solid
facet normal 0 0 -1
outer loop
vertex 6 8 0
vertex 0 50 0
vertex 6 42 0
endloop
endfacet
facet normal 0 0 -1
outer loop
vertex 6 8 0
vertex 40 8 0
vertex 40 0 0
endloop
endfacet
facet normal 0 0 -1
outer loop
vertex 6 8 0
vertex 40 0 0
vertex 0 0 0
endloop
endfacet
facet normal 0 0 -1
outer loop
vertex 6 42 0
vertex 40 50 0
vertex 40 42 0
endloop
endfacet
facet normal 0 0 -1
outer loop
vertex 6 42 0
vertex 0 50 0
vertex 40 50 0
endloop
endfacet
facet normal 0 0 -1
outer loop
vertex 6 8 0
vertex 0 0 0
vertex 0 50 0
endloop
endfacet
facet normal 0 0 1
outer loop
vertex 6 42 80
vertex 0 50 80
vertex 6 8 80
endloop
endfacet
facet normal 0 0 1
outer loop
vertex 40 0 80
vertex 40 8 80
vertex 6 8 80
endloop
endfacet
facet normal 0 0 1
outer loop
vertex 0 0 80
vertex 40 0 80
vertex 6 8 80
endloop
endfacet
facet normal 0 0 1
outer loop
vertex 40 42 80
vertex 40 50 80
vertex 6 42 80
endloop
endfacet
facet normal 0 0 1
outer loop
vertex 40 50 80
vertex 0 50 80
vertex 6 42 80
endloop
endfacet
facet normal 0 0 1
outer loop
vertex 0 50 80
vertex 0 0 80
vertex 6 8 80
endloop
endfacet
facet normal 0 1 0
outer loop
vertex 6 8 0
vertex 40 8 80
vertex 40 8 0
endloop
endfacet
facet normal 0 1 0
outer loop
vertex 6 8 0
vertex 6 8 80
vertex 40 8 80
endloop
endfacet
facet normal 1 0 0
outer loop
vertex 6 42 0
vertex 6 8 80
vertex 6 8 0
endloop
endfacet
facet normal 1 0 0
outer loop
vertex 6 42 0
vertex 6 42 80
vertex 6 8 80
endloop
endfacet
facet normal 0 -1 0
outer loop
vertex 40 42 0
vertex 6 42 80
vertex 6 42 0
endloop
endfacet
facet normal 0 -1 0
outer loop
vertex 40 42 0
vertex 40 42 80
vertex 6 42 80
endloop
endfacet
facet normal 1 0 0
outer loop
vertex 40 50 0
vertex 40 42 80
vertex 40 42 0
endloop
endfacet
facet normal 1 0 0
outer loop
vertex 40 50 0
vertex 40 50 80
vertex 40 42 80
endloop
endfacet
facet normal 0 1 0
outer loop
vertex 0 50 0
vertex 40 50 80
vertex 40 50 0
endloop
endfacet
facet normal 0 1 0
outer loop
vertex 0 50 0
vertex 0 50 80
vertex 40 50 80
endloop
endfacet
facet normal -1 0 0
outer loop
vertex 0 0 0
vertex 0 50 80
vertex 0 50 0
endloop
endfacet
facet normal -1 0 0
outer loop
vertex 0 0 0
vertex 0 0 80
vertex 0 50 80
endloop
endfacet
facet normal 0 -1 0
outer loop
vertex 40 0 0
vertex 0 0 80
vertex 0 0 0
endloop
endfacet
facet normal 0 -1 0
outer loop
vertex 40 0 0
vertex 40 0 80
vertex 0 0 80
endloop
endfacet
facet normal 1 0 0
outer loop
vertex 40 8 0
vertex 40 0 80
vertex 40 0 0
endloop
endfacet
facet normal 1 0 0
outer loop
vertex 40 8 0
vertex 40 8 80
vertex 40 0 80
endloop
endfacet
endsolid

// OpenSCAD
$fn = 32;

// ----------------------------------------------------------------------
// Structural section: channel 40 x 50 mm
// ----------------------------------------------------------------------

// --- parameters (mm) ---
sec_w = 40;               // channel width, X
sec_h = 50;               // channel height, Y
flange_t = 8;             // flange thickness
web_t = 6;                // web thickness
plate_t = 80;             // cut length, Z (extrusion height)
fit_tol = 0.1;            // declared fit tolerance (prompt contract)
free_tol = 0.3;           // declared free tolerance (prompt contract)

profile = [[0, 0], [40, 0], [40, 8], [6, 8], [6, 42], [40, 42], [40, 50], [0, 50]];  // primary outline, 8 points, counter clockwise

// --- the one profile operation ---
linear_extrude(height = plate_t) polygon(points = profile);
